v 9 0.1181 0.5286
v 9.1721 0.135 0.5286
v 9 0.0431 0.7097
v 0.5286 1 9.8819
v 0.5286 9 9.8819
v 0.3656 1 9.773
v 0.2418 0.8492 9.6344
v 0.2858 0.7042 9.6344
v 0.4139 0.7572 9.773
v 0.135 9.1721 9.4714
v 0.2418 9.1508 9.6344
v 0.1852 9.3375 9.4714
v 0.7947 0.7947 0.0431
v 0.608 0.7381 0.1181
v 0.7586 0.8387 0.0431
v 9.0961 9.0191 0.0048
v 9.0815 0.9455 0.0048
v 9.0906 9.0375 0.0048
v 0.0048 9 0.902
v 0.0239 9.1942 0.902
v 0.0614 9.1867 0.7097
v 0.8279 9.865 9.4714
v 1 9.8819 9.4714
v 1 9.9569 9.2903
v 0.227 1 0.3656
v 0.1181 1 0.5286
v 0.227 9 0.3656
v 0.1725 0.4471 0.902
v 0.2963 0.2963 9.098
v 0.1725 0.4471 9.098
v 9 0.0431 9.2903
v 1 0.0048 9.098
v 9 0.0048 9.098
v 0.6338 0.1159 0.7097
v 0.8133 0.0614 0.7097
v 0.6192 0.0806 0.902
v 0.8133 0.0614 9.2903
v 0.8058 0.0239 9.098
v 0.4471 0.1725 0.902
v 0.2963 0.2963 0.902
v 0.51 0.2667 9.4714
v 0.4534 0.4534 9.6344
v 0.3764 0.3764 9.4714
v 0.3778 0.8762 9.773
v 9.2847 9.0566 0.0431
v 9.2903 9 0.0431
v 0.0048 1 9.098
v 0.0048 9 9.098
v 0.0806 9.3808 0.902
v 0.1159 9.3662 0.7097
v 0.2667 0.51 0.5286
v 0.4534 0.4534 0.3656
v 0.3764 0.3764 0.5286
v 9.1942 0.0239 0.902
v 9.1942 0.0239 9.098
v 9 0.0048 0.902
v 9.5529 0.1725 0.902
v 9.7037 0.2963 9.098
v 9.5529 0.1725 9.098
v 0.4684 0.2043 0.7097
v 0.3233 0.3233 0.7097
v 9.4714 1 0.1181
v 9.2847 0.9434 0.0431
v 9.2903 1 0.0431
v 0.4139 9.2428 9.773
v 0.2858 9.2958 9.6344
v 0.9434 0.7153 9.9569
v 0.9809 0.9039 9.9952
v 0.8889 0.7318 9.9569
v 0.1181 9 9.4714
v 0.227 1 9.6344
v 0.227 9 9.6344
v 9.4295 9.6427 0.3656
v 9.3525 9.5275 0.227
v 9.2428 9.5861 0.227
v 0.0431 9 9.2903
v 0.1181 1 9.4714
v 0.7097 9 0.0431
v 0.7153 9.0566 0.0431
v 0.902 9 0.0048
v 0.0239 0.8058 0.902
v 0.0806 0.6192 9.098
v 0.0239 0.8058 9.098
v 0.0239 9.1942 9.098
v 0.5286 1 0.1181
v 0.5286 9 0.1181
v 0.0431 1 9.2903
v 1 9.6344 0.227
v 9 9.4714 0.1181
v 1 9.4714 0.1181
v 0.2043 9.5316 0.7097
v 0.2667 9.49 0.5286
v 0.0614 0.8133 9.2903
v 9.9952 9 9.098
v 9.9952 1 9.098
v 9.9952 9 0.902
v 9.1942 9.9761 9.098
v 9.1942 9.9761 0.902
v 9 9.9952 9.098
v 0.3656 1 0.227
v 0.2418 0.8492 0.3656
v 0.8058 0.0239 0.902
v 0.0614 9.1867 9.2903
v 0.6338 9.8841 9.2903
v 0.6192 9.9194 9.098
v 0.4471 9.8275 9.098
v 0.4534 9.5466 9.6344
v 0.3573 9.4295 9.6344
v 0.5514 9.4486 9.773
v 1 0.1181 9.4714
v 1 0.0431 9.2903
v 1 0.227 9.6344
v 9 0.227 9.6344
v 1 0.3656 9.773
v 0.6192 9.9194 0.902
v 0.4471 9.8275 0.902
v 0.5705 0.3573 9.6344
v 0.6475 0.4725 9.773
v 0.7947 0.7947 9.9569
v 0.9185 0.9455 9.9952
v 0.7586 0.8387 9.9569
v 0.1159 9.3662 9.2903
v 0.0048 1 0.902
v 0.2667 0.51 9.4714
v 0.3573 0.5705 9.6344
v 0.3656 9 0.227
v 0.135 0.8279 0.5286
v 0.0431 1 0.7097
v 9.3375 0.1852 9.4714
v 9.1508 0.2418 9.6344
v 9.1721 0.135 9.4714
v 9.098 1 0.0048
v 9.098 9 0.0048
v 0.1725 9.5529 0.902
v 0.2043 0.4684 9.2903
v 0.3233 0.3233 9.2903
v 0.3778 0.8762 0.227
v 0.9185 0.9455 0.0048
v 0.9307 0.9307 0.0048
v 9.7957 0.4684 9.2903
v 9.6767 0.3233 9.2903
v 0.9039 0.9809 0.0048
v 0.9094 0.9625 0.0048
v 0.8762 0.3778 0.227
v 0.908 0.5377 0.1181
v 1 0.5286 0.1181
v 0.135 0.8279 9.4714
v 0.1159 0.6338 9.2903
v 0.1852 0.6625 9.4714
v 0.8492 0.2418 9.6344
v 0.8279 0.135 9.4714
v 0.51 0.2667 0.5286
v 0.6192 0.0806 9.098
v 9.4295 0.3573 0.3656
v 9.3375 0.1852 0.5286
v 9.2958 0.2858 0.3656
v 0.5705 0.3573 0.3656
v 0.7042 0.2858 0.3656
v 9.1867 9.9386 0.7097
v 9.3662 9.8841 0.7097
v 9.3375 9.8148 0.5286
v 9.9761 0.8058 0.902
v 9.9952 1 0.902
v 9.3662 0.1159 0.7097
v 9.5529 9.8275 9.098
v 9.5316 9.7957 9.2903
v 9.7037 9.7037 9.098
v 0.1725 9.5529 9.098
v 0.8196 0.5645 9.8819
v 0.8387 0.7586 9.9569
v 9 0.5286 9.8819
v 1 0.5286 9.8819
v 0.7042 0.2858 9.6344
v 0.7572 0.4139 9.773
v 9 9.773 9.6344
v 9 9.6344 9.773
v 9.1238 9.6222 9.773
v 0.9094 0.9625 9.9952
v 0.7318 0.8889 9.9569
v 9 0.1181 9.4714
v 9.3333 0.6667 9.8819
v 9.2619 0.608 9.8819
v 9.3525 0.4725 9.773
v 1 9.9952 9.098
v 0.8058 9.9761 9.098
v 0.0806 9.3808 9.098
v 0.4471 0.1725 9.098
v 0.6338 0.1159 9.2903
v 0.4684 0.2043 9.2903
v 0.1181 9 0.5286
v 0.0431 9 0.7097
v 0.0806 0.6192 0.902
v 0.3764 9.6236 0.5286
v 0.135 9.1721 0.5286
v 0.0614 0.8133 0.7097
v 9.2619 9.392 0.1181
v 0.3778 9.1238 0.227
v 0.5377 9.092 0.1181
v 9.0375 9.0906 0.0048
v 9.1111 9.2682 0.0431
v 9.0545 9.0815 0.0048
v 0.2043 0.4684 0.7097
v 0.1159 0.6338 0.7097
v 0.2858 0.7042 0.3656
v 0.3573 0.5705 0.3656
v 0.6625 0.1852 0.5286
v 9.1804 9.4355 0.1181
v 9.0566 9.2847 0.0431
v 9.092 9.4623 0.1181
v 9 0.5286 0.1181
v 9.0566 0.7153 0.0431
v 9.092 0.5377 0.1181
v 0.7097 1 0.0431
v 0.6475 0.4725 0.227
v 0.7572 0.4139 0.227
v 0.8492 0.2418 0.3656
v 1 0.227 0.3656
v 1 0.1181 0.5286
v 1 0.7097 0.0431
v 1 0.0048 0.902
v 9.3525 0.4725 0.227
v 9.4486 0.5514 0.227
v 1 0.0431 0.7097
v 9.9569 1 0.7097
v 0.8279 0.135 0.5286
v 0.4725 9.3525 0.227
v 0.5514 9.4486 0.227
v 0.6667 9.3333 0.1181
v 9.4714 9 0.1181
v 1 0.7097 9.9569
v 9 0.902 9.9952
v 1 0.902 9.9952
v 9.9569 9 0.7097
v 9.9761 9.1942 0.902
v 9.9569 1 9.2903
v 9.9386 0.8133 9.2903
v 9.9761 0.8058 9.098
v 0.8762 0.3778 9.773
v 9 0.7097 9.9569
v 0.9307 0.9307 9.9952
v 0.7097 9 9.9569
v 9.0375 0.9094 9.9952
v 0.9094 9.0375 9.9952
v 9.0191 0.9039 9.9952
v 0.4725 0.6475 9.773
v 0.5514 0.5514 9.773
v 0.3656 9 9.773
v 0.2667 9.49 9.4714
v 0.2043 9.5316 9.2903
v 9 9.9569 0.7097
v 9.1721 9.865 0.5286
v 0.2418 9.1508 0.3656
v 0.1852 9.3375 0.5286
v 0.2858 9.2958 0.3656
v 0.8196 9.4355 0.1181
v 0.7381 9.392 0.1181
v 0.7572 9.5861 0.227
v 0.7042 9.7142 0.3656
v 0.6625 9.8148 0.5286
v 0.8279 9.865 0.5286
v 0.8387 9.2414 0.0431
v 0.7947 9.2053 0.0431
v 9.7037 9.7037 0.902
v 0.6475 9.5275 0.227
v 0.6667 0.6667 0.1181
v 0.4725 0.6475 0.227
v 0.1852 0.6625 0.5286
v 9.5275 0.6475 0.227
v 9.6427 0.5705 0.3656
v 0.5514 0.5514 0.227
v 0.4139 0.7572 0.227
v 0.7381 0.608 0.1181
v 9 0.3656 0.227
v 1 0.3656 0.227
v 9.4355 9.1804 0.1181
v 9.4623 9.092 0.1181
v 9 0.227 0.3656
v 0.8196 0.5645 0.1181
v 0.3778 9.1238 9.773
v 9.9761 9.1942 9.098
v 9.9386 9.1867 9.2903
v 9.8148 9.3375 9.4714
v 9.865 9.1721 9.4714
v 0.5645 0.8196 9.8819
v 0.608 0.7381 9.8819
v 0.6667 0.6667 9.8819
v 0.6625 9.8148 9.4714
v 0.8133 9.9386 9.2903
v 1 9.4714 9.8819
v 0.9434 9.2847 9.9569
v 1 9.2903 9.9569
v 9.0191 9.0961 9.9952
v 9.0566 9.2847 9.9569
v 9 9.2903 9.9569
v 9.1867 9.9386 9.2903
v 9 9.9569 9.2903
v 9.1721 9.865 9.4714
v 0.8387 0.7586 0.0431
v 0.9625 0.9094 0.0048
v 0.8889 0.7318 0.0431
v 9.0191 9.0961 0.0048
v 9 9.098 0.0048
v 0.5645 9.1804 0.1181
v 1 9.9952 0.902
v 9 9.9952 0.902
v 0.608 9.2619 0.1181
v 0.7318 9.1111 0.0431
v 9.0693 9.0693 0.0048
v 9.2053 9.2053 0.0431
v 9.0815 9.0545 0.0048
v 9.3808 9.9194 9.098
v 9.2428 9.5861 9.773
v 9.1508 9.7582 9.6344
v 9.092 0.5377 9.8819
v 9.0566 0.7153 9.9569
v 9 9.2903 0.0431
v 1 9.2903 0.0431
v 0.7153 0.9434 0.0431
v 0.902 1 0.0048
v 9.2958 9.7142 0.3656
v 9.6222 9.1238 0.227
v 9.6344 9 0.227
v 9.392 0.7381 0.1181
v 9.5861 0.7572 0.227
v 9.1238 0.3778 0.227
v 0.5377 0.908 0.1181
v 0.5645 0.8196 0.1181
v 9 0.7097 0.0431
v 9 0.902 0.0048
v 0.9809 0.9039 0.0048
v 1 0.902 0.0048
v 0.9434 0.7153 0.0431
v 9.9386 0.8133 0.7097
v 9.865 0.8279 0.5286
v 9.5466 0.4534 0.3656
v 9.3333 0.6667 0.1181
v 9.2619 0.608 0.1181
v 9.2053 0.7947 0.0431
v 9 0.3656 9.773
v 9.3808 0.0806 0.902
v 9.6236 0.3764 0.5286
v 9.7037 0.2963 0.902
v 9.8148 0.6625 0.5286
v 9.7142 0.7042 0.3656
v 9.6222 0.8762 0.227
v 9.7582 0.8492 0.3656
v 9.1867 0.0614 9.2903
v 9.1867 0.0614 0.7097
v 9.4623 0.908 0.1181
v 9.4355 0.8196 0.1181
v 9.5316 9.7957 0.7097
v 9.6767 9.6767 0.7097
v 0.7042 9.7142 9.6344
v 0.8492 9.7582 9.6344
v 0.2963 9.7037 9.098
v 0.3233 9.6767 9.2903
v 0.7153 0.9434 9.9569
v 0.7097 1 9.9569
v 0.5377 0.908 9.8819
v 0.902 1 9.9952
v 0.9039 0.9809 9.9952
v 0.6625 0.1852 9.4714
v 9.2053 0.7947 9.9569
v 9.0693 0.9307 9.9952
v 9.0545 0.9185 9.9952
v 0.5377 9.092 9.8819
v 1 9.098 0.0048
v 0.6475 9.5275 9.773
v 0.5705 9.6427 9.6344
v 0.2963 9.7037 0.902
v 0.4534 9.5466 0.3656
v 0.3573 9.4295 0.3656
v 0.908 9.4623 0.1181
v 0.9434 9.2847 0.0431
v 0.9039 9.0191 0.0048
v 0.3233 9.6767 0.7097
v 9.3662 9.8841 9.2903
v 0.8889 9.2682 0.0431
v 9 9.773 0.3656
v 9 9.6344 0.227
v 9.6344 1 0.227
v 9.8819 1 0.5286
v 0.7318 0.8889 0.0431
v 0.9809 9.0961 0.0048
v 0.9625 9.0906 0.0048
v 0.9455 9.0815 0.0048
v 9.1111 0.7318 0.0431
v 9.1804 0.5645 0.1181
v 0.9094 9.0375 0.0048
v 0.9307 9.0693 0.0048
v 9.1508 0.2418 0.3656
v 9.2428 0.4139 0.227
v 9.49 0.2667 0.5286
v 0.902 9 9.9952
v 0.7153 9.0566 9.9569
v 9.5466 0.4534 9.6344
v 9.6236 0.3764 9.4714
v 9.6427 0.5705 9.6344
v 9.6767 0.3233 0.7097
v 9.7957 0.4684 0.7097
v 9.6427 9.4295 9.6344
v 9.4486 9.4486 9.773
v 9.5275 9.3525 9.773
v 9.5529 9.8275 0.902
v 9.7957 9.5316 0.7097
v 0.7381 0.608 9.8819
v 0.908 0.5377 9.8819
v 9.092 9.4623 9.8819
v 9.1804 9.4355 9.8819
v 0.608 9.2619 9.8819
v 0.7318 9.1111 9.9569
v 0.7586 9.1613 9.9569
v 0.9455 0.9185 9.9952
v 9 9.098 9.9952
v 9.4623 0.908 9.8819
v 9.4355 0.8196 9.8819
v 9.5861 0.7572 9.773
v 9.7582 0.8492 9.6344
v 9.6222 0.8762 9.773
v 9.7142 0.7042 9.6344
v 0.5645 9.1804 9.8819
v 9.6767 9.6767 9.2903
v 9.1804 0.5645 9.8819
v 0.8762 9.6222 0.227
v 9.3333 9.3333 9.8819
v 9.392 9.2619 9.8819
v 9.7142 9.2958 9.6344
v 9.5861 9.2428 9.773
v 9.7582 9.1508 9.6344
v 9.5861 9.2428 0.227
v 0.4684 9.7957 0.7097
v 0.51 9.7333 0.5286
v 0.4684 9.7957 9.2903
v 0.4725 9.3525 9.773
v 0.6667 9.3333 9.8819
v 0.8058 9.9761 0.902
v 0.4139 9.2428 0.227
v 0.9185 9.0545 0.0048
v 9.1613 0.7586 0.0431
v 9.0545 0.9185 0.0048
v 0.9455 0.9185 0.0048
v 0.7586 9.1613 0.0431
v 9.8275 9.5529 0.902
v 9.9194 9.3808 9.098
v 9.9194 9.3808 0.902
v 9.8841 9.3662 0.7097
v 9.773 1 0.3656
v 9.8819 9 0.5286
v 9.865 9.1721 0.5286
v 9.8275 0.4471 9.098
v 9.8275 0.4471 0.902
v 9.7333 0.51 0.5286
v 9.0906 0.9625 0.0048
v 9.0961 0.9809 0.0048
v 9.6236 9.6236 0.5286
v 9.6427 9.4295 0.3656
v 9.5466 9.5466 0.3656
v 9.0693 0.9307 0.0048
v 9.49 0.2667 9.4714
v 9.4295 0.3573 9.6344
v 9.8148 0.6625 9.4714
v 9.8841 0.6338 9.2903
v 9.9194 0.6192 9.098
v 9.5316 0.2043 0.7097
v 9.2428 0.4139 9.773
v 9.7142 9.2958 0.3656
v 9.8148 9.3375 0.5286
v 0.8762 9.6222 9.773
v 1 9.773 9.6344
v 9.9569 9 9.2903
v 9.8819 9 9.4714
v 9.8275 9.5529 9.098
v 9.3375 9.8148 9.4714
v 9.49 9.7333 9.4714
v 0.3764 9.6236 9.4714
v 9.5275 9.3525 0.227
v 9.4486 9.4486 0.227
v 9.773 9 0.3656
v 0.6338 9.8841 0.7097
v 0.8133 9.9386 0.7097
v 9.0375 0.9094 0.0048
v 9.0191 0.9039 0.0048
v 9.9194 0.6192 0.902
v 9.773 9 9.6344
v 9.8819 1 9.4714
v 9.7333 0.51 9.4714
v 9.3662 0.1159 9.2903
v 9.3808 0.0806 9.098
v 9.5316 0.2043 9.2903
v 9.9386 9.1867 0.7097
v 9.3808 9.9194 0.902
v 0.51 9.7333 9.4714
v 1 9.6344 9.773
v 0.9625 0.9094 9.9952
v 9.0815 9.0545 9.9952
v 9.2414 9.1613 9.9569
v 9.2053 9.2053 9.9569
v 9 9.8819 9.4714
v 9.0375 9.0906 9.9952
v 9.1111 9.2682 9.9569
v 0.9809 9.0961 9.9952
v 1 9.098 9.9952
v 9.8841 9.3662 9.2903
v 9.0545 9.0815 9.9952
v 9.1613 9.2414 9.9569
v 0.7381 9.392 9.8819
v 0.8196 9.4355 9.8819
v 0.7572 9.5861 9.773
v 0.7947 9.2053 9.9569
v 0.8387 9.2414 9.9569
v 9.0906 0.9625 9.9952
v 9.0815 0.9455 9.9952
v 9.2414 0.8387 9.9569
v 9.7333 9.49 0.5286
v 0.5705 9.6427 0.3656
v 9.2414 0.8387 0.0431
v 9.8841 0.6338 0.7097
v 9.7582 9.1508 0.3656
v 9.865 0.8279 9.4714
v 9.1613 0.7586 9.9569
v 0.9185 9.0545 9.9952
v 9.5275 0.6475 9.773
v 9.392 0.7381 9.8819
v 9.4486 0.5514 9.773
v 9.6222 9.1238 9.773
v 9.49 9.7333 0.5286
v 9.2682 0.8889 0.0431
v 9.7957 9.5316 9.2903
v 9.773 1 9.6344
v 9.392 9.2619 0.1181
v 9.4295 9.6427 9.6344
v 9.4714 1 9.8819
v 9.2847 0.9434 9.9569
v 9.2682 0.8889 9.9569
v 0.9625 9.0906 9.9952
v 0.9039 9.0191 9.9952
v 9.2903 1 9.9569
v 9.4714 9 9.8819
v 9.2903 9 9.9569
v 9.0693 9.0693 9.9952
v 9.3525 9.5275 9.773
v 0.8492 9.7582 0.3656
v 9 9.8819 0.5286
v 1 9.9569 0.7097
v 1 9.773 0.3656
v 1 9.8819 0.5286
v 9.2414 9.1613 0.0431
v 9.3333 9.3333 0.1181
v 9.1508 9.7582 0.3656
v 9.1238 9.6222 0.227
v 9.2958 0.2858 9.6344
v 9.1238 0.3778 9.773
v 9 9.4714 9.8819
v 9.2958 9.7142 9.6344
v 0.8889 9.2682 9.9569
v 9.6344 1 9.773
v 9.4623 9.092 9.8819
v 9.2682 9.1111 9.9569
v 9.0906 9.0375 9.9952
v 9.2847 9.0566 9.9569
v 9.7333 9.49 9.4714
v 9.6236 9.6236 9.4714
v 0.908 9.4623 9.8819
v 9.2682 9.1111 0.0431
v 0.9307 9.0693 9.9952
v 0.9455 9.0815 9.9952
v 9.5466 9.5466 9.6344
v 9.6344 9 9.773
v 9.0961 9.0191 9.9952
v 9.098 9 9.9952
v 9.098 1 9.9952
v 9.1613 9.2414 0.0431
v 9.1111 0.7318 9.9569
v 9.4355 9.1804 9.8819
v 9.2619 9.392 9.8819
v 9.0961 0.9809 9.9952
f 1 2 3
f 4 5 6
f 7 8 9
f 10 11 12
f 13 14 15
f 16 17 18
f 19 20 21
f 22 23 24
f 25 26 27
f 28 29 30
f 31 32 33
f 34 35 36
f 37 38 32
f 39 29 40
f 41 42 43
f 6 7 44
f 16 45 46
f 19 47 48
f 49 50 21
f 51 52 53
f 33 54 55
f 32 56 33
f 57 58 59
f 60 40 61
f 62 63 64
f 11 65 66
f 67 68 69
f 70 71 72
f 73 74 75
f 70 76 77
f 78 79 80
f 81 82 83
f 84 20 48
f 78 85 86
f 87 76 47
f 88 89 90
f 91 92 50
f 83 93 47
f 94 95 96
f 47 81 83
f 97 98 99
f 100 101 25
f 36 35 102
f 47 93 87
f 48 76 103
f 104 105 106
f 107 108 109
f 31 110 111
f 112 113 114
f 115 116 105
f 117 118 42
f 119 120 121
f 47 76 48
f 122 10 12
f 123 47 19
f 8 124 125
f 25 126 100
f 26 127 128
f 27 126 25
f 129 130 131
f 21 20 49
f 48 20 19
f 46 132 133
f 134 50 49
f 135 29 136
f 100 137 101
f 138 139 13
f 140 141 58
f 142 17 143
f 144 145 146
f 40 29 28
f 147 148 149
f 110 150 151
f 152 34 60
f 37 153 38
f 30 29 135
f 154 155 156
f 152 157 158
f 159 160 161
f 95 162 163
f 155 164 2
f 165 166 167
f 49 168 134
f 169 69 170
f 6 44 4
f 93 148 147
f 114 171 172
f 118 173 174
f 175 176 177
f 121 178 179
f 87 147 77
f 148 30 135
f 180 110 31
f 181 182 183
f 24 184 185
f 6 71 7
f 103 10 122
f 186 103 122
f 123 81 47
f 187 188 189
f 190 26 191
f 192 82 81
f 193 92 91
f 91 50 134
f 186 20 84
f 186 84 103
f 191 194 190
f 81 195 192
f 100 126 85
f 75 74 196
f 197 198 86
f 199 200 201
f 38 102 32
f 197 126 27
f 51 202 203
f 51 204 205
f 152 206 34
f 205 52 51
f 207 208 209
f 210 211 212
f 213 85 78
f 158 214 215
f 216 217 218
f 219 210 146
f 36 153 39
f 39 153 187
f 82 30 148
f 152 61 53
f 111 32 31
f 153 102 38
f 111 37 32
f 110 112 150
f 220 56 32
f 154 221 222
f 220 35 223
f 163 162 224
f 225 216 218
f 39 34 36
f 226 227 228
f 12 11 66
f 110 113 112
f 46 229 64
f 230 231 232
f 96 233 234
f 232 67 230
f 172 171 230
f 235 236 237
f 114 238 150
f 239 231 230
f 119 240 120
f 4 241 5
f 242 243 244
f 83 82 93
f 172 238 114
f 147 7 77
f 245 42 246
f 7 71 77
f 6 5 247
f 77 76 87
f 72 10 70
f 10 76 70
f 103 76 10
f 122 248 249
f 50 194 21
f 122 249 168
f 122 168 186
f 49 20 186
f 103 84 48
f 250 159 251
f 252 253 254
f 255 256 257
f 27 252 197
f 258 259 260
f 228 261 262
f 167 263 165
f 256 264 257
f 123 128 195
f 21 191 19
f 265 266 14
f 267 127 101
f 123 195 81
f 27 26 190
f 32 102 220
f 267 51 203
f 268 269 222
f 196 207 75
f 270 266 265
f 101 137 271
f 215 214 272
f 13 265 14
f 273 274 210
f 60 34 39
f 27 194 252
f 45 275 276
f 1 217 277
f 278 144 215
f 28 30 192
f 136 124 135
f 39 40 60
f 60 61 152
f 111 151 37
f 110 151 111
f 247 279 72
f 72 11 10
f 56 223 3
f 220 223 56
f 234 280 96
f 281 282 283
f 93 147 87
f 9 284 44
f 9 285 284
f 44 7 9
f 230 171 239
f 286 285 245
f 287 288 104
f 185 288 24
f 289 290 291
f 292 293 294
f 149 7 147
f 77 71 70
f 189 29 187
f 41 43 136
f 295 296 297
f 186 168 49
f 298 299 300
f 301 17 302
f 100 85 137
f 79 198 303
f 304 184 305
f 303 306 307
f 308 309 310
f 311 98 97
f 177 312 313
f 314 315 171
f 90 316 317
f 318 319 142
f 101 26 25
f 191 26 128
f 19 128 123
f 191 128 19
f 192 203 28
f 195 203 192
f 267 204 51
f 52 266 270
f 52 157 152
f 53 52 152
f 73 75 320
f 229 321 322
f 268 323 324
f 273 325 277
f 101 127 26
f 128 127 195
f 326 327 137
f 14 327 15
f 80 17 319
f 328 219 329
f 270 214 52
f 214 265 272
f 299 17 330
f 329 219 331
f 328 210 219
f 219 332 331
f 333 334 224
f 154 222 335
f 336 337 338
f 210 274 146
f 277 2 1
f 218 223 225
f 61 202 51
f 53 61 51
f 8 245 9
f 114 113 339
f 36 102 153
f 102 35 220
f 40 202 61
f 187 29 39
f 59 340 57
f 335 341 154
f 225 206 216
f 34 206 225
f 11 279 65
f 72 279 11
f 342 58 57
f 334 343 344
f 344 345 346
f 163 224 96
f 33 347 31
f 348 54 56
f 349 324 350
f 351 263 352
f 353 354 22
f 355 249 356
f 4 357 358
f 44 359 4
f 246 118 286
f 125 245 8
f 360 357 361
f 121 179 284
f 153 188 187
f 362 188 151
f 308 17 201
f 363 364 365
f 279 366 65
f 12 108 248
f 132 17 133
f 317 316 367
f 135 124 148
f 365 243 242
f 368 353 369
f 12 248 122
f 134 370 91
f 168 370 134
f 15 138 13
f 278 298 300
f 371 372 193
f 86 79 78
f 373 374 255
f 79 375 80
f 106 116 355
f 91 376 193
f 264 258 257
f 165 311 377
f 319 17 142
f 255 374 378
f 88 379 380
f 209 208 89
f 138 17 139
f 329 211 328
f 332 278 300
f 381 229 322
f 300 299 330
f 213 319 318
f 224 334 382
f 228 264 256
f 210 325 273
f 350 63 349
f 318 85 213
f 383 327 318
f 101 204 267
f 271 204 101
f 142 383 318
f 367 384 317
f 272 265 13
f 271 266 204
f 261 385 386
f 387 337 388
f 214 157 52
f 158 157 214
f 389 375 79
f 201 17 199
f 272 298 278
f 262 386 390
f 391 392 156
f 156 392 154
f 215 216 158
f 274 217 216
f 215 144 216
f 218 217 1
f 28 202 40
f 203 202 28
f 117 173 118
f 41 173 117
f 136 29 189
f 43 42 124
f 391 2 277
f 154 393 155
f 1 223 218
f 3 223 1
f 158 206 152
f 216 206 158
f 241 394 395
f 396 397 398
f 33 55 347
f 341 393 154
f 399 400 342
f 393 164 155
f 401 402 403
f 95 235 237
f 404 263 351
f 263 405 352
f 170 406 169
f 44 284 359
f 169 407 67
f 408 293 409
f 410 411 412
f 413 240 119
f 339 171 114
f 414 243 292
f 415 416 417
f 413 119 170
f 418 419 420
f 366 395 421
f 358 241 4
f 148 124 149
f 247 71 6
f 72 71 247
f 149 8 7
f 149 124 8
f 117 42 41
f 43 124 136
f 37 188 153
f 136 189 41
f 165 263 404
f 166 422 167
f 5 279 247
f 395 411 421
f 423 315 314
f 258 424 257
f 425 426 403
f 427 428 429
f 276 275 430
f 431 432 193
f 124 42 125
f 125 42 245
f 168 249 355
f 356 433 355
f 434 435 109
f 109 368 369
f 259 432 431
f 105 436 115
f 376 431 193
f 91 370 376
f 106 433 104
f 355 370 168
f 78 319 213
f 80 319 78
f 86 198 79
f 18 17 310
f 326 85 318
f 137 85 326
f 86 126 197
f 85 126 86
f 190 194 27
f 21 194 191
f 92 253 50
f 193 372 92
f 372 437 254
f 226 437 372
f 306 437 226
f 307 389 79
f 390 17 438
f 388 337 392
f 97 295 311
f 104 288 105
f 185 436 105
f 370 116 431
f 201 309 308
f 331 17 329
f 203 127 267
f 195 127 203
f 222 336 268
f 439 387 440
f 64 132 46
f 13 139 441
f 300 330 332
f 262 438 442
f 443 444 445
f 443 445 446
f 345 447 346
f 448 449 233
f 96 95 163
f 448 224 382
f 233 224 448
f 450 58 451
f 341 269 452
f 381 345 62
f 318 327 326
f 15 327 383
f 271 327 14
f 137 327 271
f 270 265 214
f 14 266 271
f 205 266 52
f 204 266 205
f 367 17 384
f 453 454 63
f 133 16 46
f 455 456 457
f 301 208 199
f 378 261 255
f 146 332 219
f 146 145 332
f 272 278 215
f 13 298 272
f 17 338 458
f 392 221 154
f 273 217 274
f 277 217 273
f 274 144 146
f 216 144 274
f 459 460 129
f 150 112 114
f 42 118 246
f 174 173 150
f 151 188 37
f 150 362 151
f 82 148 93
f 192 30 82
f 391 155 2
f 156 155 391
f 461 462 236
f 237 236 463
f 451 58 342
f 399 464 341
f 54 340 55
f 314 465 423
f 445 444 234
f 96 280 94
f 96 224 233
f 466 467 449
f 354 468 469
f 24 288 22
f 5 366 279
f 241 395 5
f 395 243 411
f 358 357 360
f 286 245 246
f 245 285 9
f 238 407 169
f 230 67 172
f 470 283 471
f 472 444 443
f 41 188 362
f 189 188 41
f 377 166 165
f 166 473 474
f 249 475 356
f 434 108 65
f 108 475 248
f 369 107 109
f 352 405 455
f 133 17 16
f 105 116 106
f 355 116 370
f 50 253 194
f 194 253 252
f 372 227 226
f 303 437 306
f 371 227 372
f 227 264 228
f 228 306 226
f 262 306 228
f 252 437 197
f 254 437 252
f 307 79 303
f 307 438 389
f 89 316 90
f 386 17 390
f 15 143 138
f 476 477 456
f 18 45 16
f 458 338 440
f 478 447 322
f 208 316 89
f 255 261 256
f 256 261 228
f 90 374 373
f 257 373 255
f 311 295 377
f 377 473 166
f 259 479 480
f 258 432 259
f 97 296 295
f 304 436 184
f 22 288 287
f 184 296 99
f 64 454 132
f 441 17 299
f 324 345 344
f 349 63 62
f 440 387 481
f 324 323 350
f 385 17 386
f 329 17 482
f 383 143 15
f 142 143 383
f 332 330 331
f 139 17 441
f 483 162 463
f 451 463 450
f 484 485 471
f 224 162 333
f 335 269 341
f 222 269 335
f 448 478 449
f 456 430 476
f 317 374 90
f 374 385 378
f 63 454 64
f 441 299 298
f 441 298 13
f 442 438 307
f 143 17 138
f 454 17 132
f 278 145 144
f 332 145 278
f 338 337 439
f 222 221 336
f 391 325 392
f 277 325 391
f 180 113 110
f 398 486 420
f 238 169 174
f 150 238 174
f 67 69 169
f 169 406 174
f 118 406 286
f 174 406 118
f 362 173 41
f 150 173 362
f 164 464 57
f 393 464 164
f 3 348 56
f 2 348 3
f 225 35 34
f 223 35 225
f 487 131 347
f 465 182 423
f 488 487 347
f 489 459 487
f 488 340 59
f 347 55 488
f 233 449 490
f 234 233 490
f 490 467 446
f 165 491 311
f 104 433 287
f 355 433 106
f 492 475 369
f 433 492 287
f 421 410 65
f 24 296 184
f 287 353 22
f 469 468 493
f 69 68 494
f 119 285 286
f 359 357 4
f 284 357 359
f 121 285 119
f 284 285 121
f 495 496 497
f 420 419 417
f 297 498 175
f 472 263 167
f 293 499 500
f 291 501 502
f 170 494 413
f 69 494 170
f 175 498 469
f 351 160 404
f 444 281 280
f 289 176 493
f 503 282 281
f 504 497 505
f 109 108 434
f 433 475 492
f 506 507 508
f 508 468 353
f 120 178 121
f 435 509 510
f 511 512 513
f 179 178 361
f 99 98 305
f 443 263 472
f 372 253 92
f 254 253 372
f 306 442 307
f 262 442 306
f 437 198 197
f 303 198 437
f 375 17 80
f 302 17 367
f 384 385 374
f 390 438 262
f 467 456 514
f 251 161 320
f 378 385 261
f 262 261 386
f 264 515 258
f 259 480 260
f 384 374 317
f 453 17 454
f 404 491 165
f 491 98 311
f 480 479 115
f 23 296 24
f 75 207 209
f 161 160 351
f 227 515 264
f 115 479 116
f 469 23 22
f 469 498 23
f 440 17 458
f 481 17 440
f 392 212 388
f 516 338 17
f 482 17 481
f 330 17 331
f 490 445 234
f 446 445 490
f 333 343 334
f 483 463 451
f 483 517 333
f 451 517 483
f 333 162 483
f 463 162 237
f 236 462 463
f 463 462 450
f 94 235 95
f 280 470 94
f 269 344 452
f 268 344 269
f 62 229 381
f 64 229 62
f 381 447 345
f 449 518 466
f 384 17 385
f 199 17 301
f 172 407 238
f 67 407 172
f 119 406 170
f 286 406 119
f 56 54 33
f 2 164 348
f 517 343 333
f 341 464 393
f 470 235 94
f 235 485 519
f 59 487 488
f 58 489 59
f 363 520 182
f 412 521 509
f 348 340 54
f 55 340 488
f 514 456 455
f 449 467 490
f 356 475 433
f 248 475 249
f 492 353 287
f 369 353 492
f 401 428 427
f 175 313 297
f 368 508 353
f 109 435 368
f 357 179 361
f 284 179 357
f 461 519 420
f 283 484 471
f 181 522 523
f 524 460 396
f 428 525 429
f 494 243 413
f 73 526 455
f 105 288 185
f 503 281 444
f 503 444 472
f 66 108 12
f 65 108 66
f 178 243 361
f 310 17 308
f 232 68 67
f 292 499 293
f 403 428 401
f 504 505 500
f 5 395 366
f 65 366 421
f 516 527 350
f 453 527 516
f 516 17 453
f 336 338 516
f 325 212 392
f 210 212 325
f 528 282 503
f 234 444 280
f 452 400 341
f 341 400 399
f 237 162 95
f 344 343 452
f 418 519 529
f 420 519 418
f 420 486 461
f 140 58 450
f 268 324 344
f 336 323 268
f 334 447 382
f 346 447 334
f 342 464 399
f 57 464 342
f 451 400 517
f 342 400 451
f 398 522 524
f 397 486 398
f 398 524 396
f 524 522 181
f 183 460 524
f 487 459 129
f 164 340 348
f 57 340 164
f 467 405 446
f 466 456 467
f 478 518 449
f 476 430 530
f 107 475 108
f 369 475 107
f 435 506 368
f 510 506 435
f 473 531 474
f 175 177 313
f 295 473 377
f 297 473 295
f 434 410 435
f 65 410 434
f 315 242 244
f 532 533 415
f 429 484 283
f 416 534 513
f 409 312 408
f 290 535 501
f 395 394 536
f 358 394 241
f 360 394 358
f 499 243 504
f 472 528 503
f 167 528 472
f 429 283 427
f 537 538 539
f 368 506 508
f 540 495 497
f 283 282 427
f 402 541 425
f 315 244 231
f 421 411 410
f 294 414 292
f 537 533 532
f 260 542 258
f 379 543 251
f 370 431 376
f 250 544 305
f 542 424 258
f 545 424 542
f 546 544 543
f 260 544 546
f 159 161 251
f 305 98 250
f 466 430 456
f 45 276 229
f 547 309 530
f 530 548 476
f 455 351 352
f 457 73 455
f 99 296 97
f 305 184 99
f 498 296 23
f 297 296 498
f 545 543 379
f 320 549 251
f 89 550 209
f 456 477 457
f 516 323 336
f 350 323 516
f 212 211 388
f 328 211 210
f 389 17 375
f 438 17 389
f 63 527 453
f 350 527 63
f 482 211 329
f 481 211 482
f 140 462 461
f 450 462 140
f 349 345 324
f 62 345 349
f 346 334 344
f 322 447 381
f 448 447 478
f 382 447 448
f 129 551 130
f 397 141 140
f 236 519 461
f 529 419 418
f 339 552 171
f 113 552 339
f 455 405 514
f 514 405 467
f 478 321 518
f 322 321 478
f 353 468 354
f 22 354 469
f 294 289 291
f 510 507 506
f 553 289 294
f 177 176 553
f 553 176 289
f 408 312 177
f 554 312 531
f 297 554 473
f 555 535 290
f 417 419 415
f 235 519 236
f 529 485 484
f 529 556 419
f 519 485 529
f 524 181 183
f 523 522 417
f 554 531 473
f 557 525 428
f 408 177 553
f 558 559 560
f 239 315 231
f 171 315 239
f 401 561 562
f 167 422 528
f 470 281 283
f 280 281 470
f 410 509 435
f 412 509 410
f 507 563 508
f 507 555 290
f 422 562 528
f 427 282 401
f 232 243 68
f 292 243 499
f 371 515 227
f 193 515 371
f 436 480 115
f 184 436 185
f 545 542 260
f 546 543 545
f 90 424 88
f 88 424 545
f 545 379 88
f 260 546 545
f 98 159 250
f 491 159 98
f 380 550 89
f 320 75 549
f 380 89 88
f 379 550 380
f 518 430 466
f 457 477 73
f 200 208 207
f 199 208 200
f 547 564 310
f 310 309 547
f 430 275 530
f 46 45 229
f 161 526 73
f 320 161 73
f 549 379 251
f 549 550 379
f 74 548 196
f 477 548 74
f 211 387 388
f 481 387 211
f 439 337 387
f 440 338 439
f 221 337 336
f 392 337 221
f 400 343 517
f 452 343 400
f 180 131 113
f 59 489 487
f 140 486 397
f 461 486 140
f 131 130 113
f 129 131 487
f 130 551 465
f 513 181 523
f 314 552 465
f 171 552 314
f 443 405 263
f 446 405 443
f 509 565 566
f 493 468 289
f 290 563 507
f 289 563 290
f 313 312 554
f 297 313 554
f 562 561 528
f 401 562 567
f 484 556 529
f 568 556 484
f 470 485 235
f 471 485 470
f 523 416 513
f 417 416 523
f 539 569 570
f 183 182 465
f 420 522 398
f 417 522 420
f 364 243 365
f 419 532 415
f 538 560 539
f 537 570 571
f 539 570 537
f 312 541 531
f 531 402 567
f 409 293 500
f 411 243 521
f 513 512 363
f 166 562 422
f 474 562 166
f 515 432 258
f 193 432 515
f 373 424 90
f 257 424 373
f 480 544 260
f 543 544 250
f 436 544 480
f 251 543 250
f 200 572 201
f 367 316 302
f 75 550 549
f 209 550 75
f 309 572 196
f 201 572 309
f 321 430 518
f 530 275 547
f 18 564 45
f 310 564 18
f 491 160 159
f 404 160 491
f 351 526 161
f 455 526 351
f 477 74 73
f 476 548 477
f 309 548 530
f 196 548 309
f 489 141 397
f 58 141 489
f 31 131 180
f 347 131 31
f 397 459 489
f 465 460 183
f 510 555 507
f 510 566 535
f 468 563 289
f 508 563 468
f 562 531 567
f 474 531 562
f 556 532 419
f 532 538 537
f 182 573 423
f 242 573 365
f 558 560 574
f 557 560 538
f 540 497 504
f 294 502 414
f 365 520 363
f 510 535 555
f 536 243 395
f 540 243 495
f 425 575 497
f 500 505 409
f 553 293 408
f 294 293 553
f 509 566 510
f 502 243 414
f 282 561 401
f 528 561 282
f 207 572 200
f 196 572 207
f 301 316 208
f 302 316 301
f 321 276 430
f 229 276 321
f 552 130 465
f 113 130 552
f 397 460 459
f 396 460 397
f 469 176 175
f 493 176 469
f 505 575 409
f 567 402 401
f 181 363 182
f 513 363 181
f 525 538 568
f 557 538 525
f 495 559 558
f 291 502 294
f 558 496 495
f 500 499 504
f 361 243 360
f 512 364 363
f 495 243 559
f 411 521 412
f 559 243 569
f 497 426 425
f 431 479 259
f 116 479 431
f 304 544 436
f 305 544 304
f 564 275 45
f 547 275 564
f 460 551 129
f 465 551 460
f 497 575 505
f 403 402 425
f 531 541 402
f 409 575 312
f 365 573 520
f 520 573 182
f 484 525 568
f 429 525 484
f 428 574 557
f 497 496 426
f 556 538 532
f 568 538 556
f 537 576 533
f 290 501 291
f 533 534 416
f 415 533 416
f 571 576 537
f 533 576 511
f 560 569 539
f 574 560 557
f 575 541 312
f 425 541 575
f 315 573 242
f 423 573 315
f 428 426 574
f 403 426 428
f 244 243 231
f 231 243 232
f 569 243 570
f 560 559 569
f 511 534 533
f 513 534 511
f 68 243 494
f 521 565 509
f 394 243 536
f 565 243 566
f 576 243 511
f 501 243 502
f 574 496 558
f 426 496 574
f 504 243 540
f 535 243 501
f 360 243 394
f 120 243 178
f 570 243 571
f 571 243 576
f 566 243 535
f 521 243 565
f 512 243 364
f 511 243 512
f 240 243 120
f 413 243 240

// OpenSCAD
// [FL_INDEX: keywords="openscad, 3d_parametric, Rounded_cube_module_-_faster_than_minkowski, csg_solid" | COT="Parametric OpenSCAD design from 3DCodeverse"]
// Title: Rounded cube module - faster than minkowski!

//Rounded cube module - faster than minkowski!
//variables with "customizer" in them are only for the Thingiverse customizer and are not essential.


customizer_x=10;
customizer_y=10;
customizer_z=10;

customizer_facets=32;
customizer_rounding_radius=1;

module rounded_cube(size_x,size_y,size_z,facets,rounding_radius)
{
	hull()
	{
		translate([rounding_radius,rounding_radius,rounding_radius]) sphere (r=rounding_radius,$fn=facets);
		translate([size_x-rounding_radius,rounding_radius,rounding_radius]) sphere (r=rounding_radius,$fn=facets);
		translate([rounding_radius,size_y-rounding_radius,rounding_radius]) sphere (r=rounding_radius,$fn=facets);
		translate([size_x-rounding_radius,size_y-rounding_radius,rounding_radius]) sphere (r=rounding_radius,$fn=facets);

		translate([rounding_radius,rounding_radius,size_z-rounding_radius]) sphere (r=rounding_radius,$fn=facets);
		translate([size_x-rounding_radius,rounding_radius,size_z-rounding_radius]) sphere (r=rounding_radius,$fn=facets);
		translate([rounding_radius,size_y-rounding_radius,size_z-rounding_radius]) sphere (r=rounding_radius,$fn=facets);
		translate([size_x-rounding_radius,size_y-rounding_radius,size_z-rounding_radius]) sphere (r=rounding_radius,$fn=facets);
	}
}

rounded_cube(customizer_x,customizer_y,customizer_z,customizer_facets,customizer_rounding_radius);
